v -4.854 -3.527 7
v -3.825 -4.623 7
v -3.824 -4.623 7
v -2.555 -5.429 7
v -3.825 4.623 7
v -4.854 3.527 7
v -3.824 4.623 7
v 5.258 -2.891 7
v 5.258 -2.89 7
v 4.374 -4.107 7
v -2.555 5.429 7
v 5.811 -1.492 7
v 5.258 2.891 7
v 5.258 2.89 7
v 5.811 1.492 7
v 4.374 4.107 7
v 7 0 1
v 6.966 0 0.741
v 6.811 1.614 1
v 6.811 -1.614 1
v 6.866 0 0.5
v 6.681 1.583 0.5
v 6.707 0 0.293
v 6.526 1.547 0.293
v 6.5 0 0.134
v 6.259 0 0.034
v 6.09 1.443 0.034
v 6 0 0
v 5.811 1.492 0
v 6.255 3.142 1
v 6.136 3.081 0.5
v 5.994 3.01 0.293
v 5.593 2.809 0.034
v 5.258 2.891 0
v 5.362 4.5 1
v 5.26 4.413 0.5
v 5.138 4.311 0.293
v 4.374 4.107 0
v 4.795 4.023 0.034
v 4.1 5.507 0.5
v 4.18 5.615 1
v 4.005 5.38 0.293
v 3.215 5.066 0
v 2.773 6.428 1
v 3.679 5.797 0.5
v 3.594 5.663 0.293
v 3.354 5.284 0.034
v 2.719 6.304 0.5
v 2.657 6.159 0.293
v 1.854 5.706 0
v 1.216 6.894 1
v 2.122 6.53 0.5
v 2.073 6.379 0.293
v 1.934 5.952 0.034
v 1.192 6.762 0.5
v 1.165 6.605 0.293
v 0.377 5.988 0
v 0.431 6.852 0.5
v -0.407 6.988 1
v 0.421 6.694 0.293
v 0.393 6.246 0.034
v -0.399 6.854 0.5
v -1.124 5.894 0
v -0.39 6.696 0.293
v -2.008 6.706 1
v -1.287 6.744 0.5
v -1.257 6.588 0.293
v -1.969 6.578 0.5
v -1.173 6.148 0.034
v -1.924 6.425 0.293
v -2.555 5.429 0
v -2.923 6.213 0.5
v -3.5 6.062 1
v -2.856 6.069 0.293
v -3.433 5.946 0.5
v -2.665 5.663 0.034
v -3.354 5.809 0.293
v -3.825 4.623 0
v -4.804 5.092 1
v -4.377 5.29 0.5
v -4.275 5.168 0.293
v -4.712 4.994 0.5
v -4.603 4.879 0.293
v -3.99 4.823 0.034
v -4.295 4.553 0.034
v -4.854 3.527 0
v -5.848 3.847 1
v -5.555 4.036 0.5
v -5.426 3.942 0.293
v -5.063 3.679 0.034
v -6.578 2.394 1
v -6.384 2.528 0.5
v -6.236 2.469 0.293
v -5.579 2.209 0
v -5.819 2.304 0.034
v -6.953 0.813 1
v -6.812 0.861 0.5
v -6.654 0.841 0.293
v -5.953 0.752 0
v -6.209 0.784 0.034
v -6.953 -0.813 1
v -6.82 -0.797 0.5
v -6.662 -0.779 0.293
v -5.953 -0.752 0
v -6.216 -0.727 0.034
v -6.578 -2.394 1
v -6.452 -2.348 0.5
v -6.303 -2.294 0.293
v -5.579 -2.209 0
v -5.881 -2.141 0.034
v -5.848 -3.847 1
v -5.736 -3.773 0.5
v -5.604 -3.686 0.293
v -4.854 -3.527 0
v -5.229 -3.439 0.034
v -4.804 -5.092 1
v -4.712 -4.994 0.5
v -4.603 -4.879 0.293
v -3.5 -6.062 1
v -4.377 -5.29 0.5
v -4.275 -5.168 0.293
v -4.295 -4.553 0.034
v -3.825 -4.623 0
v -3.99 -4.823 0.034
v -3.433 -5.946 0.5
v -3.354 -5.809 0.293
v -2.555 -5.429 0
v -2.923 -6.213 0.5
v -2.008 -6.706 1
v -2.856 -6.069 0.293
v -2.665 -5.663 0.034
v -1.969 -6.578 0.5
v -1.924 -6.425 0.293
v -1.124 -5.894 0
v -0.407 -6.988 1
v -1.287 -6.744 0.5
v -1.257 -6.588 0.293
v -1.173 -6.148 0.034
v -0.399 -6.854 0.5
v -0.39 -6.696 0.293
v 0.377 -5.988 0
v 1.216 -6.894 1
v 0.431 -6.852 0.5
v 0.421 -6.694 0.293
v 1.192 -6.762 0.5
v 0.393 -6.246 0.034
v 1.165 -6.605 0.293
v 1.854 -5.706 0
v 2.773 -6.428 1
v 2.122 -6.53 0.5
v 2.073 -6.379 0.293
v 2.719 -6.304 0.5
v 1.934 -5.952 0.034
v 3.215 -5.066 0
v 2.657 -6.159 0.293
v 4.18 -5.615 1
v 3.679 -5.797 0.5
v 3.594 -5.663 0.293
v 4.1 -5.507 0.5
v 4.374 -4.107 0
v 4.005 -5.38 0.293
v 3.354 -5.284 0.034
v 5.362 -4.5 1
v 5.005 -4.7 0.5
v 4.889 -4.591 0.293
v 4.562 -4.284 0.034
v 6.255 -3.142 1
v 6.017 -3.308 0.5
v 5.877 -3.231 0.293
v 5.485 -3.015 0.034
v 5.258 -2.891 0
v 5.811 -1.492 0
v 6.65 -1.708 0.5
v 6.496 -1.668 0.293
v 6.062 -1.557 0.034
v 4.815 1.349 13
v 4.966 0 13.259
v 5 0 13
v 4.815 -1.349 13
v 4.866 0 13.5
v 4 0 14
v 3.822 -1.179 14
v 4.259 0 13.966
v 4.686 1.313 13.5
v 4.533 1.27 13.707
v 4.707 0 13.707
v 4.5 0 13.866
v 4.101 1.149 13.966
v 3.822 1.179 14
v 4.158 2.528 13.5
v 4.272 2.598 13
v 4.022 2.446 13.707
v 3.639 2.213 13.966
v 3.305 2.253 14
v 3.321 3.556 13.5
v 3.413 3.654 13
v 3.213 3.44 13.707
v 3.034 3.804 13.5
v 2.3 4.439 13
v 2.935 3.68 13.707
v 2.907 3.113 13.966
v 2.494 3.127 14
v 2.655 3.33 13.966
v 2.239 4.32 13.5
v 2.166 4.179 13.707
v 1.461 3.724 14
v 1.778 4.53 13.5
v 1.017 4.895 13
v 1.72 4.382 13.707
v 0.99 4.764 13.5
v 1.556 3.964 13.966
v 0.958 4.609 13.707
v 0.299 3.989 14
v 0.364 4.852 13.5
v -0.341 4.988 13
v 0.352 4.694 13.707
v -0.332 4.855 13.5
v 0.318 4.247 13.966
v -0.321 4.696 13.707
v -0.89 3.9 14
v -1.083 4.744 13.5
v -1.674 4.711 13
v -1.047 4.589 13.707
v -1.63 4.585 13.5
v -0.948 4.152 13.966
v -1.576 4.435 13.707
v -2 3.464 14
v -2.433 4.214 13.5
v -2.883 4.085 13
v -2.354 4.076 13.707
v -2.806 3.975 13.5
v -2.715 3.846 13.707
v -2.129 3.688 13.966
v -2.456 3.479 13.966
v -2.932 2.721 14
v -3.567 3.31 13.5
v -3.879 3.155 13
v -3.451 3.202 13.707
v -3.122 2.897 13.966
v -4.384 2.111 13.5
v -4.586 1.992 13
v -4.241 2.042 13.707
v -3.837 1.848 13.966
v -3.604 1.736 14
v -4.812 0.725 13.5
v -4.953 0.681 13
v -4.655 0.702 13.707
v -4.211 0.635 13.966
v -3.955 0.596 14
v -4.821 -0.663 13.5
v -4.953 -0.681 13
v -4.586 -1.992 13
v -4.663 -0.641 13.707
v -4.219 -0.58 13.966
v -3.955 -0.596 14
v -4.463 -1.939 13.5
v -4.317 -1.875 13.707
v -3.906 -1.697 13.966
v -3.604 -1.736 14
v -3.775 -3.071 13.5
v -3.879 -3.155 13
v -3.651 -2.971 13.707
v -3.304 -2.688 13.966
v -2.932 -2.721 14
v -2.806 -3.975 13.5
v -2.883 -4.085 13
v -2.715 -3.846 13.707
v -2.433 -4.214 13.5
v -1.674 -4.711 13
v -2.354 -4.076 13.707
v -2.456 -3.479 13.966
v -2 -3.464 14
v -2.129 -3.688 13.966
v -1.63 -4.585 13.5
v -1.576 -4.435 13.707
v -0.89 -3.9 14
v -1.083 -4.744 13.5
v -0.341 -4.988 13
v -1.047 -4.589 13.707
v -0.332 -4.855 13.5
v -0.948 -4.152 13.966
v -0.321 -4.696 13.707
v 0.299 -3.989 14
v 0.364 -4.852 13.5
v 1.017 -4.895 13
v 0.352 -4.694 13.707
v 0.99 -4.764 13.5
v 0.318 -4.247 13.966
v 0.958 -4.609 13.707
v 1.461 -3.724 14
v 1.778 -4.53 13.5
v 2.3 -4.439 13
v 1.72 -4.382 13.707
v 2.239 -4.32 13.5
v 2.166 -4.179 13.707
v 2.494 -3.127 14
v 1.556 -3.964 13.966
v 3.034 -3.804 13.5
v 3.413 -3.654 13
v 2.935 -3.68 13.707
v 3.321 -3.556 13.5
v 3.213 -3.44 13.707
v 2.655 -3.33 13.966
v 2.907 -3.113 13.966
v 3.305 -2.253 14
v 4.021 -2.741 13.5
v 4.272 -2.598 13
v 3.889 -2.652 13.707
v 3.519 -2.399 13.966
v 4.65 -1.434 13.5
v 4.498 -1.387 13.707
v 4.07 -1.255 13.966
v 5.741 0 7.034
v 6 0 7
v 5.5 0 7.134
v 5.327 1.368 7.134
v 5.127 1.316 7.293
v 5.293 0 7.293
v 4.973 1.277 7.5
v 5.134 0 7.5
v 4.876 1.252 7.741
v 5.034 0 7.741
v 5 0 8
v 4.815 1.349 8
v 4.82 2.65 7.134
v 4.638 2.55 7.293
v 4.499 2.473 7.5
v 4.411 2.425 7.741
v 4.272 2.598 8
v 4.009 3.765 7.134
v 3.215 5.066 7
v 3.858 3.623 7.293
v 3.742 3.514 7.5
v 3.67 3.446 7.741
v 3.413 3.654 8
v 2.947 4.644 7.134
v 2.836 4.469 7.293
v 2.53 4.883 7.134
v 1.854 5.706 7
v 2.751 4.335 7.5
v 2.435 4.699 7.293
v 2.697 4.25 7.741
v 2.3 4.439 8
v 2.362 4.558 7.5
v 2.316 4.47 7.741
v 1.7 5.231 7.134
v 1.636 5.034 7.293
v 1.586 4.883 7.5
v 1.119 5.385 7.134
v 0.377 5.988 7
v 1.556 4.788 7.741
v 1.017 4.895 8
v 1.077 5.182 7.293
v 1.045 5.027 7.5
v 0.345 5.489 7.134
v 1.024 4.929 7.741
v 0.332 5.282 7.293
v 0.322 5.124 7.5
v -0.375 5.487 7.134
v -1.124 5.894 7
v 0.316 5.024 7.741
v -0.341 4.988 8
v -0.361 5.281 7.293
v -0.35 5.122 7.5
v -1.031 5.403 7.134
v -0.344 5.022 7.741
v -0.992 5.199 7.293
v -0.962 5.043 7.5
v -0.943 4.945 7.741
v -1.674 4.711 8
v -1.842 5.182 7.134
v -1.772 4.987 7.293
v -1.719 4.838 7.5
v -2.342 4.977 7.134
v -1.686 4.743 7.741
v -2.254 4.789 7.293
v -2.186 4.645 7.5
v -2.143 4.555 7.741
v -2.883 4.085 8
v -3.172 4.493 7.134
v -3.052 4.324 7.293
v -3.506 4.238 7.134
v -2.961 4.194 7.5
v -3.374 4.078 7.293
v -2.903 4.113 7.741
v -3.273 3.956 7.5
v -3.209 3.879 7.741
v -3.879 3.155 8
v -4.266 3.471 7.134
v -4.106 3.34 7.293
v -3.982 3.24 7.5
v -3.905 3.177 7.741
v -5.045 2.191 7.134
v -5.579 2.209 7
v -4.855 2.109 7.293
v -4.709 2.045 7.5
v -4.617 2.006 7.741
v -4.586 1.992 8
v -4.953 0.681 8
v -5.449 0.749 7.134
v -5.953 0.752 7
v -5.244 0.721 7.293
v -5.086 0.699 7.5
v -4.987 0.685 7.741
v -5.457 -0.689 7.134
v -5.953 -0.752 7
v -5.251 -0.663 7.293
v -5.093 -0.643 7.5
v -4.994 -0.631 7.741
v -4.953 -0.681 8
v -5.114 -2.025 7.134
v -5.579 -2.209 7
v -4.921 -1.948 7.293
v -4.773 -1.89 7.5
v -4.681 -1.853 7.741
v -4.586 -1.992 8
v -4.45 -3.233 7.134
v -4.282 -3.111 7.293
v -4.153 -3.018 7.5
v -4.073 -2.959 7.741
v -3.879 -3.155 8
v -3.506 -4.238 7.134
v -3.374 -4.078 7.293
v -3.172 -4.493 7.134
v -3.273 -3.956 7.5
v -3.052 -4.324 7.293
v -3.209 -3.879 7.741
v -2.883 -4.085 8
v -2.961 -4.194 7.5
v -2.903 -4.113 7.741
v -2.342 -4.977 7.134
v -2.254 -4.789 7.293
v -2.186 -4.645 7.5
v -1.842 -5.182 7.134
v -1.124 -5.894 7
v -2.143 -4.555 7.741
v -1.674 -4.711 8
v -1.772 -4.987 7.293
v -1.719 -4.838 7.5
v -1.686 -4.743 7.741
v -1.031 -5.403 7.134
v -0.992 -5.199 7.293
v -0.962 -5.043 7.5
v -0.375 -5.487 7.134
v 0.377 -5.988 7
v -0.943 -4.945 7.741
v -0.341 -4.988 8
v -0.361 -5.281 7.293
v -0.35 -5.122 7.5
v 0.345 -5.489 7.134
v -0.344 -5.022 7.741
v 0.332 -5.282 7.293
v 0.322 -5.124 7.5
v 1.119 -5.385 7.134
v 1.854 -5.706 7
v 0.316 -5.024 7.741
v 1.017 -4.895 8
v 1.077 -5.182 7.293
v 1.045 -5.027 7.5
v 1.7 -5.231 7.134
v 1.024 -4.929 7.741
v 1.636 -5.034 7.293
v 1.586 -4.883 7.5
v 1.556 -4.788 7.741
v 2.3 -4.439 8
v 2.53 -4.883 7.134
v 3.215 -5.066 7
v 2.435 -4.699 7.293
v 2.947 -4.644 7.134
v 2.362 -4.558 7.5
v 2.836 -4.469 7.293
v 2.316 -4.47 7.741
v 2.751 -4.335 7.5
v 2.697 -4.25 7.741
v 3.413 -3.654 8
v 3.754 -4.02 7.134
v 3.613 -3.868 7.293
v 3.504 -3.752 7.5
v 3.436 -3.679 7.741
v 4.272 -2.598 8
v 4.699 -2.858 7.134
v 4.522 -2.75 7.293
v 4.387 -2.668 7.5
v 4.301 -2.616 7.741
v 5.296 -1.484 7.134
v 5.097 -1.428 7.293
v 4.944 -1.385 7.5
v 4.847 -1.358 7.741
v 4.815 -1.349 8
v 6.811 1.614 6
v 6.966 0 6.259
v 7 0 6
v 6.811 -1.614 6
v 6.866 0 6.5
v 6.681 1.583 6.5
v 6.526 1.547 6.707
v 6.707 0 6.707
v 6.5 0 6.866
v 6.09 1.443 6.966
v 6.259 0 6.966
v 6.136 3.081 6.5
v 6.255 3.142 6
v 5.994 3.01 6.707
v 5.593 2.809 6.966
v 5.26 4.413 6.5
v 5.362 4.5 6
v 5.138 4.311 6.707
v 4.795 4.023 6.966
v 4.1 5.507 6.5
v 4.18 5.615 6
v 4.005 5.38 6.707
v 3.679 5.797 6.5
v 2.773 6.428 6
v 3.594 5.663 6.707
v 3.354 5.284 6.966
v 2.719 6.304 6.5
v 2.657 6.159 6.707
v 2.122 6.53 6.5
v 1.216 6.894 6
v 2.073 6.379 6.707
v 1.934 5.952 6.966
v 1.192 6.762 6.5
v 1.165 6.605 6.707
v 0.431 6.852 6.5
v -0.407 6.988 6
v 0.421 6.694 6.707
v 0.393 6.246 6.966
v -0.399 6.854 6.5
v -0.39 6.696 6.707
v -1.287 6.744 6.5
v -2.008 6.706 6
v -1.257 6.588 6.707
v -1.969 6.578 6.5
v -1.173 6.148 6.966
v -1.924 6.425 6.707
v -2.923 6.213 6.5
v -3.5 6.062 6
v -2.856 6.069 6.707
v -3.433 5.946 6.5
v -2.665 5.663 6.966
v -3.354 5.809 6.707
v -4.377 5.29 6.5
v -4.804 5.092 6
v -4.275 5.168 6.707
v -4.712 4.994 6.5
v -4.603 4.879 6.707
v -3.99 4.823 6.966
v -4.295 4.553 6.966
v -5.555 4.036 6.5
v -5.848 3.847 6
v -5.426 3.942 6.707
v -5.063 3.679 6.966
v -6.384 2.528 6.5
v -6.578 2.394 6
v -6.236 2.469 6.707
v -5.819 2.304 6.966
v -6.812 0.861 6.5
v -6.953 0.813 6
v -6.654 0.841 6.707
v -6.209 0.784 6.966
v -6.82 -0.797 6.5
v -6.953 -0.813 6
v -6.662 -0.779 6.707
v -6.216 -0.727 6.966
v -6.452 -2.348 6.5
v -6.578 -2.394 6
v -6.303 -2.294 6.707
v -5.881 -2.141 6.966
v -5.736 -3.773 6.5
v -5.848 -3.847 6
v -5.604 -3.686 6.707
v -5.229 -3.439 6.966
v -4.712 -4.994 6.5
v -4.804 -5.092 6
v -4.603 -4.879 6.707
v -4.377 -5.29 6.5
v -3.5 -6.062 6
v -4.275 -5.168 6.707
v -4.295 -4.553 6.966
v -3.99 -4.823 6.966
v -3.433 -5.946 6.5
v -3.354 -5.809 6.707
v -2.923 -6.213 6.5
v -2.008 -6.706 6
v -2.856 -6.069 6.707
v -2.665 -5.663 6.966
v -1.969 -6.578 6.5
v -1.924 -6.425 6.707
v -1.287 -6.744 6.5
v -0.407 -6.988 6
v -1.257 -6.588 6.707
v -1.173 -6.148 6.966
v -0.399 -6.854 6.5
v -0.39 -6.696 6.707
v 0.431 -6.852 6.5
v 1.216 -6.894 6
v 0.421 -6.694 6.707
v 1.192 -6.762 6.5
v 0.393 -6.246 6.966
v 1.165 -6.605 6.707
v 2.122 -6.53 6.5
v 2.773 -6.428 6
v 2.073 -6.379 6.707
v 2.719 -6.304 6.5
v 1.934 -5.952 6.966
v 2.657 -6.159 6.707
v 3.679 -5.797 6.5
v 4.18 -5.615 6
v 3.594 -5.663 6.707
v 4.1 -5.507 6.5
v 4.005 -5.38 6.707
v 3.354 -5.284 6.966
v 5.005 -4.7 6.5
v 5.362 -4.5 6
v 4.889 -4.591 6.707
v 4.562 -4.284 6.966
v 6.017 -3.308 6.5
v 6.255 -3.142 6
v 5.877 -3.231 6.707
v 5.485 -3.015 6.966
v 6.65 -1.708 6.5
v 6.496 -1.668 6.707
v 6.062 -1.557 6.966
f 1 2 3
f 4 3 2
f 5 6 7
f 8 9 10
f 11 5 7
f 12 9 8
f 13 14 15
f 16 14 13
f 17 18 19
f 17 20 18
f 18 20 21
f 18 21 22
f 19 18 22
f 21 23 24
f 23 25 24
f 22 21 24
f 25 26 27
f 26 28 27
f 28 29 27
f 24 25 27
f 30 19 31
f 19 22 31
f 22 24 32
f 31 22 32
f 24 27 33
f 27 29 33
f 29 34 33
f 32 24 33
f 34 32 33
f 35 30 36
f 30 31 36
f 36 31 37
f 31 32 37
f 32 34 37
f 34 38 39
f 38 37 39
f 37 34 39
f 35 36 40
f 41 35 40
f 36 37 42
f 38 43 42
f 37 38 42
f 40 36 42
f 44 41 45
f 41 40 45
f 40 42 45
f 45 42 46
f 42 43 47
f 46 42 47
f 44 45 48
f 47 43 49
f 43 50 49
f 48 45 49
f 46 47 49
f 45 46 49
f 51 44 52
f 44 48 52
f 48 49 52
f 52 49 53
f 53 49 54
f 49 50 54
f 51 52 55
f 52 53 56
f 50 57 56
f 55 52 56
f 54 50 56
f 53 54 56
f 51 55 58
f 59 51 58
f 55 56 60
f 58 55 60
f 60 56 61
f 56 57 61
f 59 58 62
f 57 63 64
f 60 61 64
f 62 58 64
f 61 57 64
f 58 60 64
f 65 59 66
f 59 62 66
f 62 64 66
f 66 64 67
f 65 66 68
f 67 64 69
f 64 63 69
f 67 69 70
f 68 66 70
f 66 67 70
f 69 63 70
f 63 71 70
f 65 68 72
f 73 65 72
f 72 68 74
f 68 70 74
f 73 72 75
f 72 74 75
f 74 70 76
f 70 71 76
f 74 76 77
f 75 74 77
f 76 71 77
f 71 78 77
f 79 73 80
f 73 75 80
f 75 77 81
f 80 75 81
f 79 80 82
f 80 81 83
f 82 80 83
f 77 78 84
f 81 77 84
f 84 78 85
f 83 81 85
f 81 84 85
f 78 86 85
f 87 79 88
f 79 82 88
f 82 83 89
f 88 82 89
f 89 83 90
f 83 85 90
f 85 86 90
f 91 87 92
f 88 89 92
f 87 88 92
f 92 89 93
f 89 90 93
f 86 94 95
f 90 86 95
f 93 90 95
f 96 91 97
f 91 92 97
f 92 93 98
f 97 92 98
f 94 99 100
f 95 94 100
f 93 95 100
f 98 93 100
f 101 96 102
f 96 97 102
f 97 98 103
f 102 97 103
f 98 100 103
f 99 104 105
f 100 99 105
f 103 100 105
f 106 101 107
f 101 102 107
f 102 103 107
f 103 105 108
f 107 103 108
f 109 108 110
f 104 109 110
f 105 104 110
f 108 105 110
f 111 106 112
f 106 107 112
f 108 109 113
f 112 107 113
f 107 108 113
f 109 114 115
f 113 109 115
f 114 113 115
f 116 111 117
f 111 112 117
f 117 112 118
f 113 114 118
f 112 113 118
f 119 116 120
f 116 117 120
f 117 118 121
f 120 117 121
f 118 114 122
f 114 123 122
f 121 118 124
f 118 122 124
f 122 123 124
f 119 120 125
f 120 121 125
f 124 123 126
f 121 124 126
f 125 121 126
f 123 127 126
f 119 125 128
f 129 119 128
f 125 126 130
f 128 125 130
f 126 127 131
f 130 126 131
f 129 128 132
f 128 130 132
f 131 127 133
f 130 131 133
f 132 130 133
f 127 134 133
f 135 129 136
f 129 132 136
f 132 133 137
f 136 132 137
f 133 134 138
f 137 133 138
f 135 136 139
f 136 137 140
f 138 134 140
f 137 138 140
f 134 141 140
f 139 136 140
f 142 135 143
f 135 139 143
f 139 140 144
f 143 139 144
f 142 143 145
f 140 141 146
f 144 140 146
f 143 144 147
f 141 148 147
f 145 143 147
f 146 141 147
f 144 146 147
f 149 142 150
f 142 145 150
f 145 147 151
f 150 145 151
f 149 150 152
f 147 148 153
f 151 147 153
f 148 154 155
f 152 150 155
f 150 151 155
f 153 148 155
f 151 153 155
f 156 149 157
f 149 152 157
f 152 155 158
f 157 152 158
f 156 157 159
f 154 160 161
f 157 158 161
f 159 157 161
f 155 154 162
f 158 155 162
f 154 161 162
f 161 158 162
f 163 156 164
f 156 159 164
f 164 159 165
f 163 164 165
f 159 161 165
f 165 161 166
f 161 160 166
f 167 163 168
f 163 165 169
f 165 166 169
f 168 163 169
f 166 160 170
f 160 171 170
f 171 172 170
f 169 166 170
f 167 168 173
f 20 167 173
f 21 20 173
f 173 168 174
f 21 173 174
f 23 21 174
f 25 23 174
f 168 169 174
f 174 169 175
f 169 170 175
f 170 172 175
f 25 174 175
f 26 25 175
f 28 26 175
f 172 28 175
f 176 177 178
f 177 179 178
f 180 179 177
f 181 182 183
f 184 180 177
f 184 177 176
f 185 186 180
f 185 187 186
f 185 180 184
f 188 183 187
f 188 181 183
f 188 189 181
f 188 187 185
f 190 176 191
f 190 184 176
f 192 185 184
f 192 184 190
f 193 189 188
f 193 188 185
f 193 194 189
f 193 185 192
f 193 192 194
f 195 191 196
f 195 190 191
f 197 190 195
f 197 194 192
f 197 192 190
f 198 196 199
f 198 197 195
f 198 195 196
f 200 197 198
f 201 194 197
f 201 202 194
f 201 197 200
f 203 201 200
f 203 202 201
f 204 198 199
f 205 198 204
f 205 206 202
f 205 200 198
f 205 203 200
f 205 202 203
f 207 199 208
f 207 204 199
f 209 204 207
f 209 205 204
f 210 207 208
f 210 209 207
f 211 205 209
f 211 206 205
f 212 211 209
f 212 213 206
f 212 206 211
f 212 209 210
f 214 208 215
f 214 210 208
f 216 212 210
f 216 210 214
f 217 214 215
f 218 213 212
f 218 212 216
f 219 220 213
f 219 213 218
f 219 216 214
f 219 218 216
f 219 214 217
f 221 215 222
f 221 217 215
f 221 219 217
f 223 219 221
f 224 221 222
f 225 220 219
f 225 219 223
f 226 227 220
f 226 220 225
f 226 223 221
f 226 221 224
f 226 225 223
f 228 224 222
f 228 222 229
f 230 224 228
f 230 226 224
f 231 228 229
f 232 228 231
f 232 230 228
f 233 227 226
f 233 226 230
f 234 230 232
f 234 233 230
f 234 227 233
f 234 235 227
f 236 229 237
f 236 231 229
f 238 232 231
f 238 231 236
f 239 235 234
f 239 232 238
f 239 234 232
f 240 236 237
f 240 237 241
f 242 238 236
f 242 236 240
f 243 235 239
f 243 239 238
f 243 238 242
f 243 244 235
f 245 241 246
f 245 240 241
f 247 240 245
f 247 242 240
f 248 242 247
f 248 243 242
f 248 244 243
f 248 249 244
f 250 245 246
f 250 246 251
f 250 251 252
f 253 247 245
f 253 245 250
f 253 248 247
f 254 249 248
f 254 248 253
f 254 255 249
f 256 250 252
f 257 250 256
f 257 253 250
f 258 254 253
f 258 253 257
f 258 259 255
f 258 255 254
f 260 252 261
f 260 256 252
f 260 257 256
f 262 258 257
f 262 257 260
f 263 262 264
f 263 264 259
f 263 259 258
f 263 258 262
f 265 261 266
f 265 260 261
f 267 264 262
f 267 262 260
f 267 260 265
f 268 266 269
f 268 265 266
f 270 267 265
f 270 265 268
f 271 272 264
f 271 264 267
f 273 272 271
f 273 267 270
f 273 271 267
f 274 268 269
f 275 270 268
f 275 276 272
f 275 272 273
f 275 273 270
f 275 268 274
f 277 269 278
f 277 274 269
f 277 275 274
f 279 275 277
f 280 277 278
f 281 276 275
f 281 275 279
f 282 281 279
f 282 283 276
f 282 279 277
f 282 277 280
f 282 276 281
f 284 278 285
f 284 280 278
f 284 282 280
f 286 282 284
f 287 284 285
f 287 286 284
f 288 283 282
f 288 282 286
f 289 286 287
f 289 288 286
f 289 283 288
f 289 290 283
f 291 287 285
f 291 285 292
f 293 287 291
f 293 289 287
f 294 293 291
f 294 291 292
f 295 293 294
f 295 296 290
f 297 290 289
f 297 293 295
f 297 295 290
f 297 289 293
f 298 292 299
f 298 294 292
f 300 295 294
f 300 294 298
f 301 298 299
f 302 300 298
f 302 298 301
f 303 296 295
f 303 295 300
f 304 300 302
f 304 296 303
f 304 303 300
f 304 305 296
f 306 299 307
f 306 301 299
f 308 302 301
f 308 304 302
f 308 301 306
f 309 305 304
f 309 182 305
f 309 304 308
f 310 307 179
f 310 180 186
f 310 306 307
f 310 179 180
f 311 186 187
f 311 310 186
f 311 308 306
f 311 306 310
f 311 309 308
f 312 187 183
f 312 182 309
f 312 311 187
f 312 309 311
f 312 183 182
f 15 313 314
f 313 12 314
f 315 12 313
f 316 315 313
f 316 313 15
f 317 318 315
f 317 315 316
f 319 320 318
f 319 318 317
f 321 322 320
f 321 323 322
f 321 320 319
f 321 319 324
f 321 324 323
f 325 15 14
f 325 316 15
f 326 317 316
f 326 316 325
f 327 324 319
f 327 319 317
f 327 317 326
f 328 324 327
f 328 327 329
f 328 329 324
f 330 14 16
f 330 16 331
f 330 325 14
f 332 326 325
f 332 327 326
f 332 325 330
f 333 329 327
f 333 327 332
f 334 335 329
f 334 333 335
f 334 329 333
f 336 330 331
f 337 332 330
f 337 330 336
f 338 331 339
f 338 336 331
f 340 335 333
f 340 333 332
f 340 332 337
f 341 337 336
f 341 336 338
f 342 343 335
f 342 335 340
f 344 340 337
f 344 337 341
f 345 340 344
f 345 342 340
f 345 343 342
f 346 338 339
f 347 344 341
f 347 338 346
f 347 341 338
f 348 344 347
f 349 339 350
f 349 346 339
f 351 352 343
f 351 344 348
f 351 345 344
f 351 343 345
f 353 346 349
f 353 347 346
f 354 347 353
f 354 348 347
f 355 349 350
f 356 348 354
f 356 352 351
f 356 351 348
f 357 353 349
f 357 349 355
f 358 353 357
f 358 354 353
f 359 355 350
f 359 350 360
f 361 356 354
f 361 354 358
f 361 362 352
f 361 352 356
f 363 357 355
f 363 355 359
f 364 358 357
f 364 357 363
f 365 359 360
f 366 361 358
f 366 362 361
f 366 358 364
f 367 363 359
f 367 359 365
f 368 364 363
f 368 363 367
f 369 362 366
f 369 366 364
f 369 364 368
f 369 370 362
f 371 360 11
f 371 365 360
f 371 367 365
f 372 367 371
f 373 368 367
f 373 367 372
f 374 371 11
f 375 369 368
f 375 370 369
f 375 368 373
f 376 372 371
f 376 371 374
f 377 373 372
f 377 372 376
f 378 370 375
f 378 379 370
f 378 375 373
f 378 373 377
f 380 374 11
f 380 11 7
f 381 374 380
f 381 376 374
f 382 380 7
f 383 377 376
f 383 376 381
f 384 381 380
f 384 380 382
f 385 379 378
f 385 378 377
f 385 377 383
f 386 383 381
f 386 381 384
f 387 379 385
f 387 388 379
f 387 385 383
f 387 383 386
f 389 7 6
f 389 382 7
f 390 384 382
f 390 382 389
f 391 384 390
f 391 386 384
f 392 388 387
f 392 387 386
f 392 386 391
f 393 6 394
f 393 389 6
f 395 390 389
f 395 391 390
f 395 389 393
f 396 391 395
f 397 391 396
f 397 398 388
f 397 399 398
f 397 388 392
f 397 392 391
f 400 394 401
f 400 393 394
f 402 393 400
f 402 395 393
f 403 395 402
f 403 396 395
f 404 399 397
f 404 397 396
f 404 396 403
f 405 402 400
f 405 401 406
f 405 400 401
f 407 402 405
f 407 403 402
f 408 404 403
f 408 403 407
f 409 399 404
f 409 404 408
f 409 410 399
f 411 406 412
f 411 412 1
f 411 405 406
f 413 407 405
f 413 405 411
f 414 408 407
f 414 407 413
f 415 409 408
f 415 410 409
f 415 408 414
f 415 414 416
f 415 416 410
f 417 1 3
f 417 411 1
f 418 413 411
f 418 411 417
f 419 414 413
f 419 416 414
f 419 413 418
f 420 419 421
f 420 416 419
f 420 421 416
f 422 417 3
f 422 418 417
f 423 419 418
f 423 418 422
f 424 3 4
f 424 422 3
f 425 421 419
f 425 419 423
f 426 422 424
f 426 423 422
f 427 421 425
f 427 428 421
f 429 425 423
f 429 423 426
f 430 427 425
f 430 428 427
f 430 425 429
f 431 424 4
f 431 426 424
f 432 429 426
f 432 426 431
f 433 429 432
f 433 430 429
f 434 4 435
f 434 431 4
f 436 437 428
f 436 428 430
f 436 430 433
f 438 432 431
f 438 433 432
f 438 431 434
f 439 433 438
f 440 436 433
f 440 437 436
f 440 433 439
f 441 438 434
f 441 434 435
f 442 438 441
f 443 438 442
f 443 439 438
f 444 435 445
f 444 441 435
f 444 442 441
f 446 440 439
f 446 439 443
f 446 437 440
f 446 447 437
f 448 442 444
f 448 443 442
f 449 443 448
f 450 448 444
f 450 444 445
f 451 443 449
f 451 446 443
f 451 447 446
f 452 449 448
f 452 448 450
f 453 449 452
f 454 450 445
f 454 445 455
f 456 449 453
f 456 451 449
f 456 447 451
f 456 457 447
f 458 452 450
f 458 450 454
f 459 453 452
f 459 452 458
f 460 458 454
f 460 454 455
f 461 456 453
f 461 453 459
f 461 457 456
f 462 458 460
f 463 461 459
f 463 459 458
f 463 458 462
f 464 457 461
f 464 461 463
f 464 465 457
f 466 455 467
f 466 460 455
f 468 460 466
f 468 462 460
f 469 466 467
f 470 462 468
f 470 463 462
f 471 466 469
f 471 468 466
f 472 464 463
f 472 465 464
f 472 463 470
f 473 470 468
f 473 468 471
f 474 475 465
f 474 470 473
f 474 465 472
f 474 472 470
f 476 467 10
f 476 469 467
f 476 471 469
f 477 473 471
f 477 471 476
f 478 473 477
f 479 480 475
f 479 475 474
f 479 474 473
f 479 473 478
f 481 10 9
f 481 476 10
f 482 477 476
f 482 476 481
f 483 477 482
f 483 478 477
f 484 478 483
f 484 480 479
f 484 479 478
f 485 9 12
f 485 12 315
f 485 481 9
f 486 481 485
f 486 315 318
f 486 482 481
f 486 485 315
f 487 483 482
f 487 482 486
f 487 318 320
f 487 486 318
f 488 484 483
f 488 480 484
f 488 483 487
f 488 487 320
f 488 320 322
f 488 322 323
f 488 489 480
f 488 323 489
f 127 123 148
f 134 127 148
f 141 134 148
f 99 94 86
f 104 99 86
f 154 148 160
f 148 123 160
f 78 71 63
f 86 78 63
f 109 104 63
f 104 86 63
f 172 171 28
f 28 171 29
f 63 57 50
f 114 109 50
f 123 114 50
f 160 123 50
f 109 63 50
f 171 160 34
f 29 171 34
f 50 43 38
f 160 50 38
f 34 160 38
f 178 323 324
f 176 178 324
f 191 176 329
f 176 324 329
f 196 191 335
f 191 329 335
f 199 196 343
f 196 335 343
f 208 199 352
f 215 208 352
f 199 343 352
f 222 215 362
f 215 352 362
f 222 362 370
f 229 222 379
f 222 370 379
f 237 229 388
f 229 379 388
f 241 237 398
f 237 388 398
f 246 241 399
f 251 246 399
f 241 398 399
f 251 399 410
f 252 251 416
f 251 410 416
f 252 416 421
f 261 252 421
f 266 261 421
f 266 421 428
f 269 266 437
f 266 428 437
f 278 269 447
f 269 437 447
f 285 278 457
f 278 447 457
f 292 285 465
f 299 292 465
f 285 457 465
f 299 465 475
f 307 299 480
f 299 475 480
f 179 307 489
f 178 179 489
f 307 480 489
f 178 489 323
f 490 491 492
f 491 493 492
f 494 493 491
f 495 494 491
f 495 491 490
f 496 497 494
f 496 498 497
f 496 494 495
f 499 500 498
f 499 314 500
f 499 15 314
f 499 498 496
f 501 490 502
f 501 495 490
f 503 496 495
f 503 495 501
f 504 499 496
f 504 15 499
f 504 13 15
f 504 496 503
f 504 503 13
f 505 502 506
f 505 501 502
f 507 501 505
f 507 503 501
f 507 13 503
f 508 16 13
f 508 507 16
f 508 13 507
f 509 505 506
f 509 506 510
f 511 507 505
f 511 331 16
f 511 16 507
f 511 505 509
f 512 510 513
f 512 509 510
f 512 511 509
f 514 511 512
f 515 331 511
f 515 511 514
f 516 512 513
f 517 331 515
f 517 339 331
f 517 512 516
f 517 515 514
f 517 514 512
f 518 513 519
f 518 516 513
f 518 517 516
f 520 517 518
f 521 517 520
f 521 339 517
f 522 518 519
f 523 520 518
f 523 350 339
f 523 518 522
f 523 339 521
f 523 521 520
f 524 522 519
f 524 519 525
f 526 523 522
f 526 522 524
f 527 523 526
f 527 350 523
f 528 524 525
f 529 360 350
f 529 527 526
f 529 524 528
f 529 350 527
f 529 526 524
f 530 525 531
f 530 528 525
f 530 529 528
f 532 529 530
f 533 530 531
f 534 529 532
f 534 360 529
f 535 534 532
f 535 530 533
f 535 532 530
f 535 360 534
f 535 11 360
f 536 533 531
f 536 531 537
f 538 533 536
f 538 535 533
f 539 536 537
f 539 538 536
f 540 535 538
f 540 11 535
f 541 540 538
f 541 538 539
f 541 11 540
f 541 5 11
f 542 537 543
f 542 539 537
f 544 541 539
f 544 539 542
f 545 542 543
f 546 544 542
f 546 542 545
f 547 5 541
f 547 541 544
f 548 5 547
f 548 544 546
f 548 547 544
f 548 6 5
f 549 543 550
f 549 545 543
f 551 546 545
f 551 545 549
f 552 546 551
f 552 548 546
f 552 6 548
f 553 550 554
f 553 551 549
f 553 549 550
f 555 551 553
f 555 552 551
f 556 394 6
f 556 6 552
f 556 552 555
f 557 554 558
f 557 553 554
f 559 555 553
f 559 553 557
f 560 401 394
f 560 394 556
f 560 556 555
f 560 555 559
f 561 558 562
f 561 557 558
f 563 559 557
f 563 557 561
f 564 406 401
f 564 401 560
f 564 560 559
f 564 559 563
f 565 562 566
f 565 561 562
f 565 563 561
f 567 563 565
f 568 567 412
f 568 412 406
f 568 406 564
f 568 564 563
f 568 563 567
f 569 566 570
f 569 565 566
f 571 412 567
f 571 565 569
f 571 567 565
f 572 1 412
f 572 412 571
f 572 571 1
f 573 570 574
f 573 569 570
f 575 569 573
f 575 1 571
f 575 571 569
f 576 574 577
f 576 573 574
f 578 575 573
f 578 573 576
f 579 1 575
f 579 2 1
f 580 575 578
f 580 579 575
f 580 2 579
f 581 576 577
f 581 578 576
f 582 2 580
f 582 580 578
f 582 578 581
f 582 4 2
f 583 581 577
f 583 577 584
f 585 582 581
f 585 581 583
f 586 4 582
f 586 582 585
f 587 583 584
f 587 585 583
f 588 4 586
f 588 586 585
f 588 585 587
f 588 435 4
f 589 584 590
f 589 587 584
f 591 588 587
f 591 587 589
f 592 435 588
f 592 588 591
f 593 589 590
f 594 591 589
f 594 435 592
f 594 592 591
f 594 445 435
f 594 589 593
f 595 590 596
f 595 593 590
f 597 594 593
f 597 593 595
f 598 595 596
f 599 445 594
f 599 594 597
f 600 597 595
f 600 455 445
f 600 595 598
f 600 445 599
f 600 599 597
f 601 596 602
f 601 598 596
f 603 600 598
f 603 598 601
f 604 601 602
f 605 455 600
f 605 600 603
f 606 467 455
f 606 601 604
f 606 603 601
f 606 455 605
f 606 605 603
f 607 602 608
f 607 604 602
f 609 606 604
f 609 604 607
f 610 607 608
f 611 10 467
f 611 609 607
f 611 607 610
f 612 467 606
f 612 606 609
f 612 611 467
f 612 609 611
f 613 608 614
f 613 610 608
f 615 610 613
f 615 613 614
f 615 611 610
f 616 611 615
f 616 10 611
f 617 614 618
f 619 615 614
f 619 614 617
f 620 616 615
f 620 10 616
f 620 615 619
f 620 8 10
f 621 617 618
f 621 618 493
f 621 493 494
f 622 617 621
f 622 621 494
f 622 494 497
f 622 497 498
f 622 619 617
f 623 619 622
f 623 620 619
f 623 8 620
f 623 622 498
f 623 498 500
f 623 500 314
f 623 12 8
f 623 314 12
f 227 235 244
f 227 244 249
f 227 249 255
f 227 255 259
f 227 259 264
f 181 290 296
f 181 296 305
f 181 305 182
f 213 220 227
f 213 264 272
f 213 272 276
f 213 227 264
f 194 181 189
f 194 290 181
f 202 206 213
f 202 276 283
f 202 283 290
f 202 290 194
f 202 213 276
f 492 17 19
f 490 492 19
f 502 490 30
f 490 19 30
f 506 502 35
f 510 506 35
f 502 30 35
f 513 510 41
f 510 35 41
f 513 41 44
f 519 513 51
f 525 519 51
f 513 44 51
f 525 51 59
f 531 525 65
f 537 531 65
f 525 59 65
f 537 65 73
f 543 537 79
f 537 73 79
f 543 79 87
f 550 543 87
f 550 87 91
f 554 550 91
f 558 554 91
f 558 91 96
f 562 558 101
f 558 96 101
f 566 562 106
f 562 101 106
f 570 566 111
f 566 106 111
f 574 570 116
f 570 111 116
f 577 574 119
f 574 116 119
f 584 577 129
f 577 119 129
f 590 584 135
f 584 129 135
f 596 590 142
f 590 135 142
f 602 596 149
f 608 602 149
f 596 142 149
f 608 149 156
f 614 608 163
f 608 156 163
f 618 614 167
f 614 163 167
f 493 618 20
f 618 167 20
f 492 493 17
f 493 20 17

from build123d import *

# Parameters (mm, degrees)
SKETCH1_R           = 7
BOSS_EXTRUDE1_DEPTH = 7
FILLET1_R           = 1
SKETCH2_R           = 5
BOSS_EXTRUDE2_DEPTH = 7
FILLET2_R           = 1


with BuildPart() as part:
    # Sketch1 → Boss-Extrude1 (new body)
    with BuildSketch(Plane.XY):
        Circle(SKETCH1_R)
    extrude(amount=BOSS_EXTRUDE1_DEPTH)

    # Fillet1
    fillet1_edges = [part.edges().sort_by_distance(p)[0] for p in [
        (-7, 0, 0),
        (-7, 0, 7),
    ]]
    fillet(fillet1_edges, radius=FILLET1_R)

    # Sketch2 → Boss-Extrude2 (add)
    with BuildSketch(Plane.XY.offset(7)):
        Circle(SKETCH2_R)
    extrude(amount=BOSS_EXTRUDE2_DEPTH)

    # Fillet2
    fillet2_edges = [part.edges().sort_by_distance(p)[0] for p in [
        (-5, 0, 7),
        (-5, 0, 14),
    ]]
    fillet(fillet2_edges, radius=FILLET2_R - 0.0001)  # a hair under: the kernel refuses the full size


solid = part.part
